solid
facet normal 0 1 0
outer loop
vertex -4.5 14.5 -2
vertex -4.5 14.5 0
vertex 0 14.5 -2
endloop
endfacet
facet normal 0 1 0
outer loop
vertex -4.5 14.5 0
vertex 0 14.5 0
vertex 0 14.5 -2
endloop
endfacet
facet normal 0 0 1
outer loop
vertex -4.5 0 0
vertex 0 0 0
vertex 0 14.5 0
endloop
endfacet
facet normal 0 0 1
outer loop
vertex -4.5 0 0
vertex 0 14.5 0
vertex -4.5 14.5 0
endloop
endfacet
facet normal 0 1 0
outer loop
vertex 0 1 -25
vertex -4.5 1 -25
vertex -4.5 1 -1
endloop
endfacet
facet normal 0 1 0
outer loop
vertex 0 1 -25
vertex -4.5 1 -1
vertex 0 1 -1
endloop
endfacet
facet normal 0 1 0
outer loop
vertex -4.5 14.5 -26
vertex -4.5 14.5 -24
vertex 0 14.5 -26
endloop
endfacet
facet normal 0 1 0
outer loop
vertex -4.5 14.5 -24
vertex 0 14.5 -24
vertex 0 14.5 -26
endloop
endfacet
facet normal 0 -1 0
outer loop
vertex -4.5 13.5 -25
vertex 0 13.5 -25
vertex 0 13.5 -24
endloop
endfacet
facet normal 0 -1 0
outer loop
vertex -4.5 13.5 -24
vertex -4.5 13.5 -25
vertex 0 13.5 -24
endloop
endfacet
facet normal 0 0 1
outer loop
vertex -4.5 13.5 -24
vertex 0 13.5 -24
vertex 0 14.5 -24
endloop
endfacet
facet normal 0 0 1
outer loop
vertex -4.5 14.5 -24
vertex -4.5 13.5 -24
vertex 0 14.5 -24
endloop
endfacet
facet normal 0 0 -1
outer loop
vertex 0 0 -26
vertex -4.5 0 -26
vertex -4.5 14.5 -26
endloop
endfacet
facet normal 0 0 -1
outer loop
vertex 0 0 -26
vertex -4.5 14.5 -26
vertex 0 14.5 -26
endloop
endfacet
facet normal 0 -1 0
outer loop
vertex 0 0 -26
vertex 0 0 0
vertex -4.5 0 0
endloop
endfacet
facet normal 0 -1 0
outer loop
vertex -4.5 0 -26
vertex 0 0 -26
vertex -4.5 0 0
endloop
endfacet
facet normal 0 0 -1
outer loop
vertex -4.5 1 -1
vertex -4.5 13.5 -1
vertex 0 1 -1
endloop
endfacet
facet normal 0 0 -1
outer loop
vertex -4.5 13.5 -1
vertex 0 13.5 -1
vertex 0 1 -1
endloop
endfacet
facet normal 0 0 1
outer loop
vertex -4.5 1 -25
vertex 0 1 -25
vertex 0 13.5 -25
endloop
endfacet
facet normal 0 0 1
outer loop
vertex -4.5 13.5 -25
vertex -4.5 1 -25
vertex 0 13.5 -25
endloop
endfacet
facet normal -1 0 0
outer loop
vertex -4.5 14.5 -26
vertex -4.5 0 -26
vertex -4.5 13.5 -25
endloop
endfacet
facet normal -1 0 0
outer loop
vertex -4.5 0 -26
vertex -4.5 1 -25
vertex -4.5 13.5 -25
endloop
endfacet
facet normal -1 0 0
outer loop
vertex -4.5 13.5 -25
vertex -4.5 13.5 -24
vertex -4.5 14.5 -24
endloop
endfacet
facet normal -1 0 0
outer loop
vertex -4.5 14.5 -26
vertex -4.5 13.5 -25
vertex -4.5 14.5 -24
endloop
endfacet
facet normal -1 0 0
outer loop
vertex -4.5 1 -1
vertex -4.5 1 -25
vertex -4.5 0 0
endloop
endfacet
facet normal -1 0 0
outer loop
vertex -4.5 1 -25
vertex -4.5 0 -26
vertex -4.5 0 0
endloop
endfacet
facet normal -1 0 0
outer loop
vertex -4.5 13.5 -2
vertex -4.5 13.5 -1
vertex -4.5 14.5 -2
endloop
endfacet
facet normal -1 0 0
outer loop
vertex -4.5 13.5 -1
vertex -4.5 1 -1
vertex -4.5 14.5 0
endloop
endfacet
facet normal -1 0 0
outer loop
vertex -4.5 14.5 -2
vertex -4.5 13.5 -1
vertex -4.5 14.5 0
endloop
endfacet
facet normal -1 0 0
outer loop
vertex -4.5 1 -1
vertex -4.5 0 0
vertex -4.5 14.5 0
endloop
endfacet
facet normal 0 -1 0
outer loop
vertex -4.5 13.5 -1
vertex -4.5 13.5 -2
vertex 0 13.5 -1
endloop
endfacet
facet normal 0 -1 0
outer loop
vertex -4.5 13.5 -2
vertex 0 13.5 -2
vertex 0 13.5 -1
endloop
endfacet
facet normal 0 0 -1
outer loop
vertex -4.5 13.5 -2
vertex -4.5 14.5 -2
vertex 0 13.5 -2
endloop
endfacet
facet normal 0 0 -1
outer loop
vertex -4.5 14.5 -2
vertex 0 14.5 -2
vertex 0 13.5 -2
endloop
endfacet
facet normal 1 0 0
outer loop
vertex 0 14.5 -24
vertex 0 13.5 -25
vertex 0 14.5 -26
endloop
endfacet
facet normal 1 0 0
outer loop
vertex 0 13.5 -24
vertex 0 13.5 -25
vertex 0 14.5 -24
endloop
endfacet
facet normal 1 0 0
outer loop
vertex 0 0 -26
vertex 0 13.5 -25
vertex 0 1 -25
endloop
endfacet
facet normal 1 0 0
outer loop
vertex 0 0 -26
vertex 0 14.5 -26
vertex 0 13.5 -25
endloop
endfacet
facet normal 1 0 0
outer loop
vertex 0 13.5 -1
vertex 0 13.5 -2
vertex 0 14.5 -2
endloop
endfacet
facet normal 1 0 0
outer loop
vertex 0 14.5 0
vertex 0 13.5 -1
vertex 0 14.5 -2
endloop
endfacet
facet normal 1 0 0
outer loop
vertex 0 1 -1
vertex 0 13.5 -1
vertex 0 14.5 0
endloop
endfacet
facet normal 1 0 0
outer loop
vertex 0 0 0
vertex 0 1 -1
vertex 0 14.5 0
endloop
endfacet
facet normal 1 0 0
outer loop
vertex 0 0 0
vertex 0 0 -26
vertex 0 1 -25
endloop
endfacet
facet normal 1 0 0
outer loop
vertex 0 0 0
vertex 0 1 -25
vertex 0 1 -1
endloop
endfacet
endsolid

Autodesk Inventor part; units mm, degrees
ref_plane "YZ Plane" through (0, 0, 0) normal (1, 0, 0) x (0, 1, 0)
ref_plane "XZ Plane" through (0, 0, 0) normal (0, 1, 0) x (-1, 0, 0)
ref_plane "XY Plane" through (0, 0, 0) normal (0, 0, 1) x (1, 0, 0)
sketch "Skizze1" plane through (0, 0, 0) normal (0, 1, 0) x (-1, 0, 0)
  line L0 (0, 0) -> (12, 0)
  line L1 (12, 0) -> (12, -26)
  line L2 (12, -26) -> (0, -26)
  line L3 (0, -26) -> (0, 0)
  dimension "d0" = 12
  dimension "d1" = 26
extrude "Extrusion1" add sketch "Skizze1" along normal blind 1
sketch "Skizze2" plane through (0, 0, 0) normal (1, 0, 0) x (0, 0, -1)
  line L0 (26, 1) -> (0, 1) projected
  line L1 (0, 1) -> (0, 14.5)
  line L2 (0, 1) -> (13.5, 1) construction
  line L3 (0, 14.5) -> (2, 14.5)
  line L4 (2, 14.5) -> (2, 13.5)
  line L5 (2, 13.5) -> (1, 13.5)
  line L6 (1, 13.5) -> (1, 1)
  line L7 (0, 1) -> (1, 1)
  line L8 (24, 14.5) -> (26, 14.5)
  line L9 (26, 14.5) -> (26, 1)
  line L10 (26, 1) -> (25, 1)
  line L11 (25, 1) -> (25, 13.5)
  line L12 (25, 13.5) -> (24, 13.5)
  line L13 (24, 13.5) -> (24, 14.5)
  line L14 (25, 1) -> (26, 1)
  line L15 (26, 0) -> (26, 1) projected
  point P0 (0, 0)
  dimension "d4" = 13.5
  dimension "d5" = 90
  dimension "d6" = 2
  dimension "d7" = 1
  dimension "d8" = 1
  dimension "d9" = 2
  dimension "d10" = 24
  dimension "d11" = 1
  dimension "d12" = 13.5
  dimension "d13" = 0
extrude "Extrusion2" add sketch "Skizze2" against normal blind 12
sketch "Skizze3" plane through (-12, 0, 0) normal (0, 0, 1) x (1, 0, 0)
  line L0 (0, 0) -> (0, 14.5) projected
  line L1 (0, 0) -> (4, 0)
  line L2 (4, 0) -> (4, 1)
  line L3 (4, 1) -> (0, 1)
  line L4 (0, 1) -> (0, 0)
  line L5 (12, 14.5) -> (0, 14.5) projected
  line L6 (5, 14.5) -> (7.5, 14.5)
  line L7 (7.5, 14.5) -> (7.5, 1)
  line L8 (5, 14.5) -> (5, 1)
  line L9 (5, 1) -> (7.5, 1)
  line L10 (12, 0) -> (12, 14.5) projected
  dimension "d16" = 4
  dimension "d17" = 1
  dimension "d18" = 2.5
  dimension "d19" = 13.5
  dimension "d20" = 13.5
  dimension "d21" = 2.5
  dimension "d22" = 90
  dimension "d23" = 4.5
extrude "Extrusion3" cut sketch "Skizze3" against normal blind 26.5
sketch "Skizze4" plane through (0, 0, 0) normal (0, 0, 1) x (1, 0, 0)
  line L0 (-4.5, 1) -> (-4.5, 14.5) projected
  line L1 (-4.5, 14.5) -> (-16.7717, 14.5)
  line L2 (-16.7717, 14.5) -> (-16.7717, 0)
  line L3 (-16.7717, 0) -> (-4.5, 0)
  line L4 (-4.5, 0) -> (-4.5, 14.5)
  point P0 (0, 0)
extrude "Extrusion4" cut sketch "Skizze4" against normal blind 26.5
equation "\"Biegeradius\" = Stärke"
equation "\"BreiteBiegungsfreistellung\" = Stärke"
equation "\"TiefeBiegungsfreistellung\" = 0.5 * Stärke"
equation "\"GrößeEckenfreistellung\" = 4 * Stärke"
equation "\"MinimalRest\" = 2 * Stärke"
equation "\"Übergangsradius\" = Biegeradius"
equation "\"JacobiRadiusGröße\" = Biegeradius"
equation "\"Abstandsgröße\" = Stärke"
equation "\"Stärke\" = 0.5"
properties part number "ServoHalterung_unten"
